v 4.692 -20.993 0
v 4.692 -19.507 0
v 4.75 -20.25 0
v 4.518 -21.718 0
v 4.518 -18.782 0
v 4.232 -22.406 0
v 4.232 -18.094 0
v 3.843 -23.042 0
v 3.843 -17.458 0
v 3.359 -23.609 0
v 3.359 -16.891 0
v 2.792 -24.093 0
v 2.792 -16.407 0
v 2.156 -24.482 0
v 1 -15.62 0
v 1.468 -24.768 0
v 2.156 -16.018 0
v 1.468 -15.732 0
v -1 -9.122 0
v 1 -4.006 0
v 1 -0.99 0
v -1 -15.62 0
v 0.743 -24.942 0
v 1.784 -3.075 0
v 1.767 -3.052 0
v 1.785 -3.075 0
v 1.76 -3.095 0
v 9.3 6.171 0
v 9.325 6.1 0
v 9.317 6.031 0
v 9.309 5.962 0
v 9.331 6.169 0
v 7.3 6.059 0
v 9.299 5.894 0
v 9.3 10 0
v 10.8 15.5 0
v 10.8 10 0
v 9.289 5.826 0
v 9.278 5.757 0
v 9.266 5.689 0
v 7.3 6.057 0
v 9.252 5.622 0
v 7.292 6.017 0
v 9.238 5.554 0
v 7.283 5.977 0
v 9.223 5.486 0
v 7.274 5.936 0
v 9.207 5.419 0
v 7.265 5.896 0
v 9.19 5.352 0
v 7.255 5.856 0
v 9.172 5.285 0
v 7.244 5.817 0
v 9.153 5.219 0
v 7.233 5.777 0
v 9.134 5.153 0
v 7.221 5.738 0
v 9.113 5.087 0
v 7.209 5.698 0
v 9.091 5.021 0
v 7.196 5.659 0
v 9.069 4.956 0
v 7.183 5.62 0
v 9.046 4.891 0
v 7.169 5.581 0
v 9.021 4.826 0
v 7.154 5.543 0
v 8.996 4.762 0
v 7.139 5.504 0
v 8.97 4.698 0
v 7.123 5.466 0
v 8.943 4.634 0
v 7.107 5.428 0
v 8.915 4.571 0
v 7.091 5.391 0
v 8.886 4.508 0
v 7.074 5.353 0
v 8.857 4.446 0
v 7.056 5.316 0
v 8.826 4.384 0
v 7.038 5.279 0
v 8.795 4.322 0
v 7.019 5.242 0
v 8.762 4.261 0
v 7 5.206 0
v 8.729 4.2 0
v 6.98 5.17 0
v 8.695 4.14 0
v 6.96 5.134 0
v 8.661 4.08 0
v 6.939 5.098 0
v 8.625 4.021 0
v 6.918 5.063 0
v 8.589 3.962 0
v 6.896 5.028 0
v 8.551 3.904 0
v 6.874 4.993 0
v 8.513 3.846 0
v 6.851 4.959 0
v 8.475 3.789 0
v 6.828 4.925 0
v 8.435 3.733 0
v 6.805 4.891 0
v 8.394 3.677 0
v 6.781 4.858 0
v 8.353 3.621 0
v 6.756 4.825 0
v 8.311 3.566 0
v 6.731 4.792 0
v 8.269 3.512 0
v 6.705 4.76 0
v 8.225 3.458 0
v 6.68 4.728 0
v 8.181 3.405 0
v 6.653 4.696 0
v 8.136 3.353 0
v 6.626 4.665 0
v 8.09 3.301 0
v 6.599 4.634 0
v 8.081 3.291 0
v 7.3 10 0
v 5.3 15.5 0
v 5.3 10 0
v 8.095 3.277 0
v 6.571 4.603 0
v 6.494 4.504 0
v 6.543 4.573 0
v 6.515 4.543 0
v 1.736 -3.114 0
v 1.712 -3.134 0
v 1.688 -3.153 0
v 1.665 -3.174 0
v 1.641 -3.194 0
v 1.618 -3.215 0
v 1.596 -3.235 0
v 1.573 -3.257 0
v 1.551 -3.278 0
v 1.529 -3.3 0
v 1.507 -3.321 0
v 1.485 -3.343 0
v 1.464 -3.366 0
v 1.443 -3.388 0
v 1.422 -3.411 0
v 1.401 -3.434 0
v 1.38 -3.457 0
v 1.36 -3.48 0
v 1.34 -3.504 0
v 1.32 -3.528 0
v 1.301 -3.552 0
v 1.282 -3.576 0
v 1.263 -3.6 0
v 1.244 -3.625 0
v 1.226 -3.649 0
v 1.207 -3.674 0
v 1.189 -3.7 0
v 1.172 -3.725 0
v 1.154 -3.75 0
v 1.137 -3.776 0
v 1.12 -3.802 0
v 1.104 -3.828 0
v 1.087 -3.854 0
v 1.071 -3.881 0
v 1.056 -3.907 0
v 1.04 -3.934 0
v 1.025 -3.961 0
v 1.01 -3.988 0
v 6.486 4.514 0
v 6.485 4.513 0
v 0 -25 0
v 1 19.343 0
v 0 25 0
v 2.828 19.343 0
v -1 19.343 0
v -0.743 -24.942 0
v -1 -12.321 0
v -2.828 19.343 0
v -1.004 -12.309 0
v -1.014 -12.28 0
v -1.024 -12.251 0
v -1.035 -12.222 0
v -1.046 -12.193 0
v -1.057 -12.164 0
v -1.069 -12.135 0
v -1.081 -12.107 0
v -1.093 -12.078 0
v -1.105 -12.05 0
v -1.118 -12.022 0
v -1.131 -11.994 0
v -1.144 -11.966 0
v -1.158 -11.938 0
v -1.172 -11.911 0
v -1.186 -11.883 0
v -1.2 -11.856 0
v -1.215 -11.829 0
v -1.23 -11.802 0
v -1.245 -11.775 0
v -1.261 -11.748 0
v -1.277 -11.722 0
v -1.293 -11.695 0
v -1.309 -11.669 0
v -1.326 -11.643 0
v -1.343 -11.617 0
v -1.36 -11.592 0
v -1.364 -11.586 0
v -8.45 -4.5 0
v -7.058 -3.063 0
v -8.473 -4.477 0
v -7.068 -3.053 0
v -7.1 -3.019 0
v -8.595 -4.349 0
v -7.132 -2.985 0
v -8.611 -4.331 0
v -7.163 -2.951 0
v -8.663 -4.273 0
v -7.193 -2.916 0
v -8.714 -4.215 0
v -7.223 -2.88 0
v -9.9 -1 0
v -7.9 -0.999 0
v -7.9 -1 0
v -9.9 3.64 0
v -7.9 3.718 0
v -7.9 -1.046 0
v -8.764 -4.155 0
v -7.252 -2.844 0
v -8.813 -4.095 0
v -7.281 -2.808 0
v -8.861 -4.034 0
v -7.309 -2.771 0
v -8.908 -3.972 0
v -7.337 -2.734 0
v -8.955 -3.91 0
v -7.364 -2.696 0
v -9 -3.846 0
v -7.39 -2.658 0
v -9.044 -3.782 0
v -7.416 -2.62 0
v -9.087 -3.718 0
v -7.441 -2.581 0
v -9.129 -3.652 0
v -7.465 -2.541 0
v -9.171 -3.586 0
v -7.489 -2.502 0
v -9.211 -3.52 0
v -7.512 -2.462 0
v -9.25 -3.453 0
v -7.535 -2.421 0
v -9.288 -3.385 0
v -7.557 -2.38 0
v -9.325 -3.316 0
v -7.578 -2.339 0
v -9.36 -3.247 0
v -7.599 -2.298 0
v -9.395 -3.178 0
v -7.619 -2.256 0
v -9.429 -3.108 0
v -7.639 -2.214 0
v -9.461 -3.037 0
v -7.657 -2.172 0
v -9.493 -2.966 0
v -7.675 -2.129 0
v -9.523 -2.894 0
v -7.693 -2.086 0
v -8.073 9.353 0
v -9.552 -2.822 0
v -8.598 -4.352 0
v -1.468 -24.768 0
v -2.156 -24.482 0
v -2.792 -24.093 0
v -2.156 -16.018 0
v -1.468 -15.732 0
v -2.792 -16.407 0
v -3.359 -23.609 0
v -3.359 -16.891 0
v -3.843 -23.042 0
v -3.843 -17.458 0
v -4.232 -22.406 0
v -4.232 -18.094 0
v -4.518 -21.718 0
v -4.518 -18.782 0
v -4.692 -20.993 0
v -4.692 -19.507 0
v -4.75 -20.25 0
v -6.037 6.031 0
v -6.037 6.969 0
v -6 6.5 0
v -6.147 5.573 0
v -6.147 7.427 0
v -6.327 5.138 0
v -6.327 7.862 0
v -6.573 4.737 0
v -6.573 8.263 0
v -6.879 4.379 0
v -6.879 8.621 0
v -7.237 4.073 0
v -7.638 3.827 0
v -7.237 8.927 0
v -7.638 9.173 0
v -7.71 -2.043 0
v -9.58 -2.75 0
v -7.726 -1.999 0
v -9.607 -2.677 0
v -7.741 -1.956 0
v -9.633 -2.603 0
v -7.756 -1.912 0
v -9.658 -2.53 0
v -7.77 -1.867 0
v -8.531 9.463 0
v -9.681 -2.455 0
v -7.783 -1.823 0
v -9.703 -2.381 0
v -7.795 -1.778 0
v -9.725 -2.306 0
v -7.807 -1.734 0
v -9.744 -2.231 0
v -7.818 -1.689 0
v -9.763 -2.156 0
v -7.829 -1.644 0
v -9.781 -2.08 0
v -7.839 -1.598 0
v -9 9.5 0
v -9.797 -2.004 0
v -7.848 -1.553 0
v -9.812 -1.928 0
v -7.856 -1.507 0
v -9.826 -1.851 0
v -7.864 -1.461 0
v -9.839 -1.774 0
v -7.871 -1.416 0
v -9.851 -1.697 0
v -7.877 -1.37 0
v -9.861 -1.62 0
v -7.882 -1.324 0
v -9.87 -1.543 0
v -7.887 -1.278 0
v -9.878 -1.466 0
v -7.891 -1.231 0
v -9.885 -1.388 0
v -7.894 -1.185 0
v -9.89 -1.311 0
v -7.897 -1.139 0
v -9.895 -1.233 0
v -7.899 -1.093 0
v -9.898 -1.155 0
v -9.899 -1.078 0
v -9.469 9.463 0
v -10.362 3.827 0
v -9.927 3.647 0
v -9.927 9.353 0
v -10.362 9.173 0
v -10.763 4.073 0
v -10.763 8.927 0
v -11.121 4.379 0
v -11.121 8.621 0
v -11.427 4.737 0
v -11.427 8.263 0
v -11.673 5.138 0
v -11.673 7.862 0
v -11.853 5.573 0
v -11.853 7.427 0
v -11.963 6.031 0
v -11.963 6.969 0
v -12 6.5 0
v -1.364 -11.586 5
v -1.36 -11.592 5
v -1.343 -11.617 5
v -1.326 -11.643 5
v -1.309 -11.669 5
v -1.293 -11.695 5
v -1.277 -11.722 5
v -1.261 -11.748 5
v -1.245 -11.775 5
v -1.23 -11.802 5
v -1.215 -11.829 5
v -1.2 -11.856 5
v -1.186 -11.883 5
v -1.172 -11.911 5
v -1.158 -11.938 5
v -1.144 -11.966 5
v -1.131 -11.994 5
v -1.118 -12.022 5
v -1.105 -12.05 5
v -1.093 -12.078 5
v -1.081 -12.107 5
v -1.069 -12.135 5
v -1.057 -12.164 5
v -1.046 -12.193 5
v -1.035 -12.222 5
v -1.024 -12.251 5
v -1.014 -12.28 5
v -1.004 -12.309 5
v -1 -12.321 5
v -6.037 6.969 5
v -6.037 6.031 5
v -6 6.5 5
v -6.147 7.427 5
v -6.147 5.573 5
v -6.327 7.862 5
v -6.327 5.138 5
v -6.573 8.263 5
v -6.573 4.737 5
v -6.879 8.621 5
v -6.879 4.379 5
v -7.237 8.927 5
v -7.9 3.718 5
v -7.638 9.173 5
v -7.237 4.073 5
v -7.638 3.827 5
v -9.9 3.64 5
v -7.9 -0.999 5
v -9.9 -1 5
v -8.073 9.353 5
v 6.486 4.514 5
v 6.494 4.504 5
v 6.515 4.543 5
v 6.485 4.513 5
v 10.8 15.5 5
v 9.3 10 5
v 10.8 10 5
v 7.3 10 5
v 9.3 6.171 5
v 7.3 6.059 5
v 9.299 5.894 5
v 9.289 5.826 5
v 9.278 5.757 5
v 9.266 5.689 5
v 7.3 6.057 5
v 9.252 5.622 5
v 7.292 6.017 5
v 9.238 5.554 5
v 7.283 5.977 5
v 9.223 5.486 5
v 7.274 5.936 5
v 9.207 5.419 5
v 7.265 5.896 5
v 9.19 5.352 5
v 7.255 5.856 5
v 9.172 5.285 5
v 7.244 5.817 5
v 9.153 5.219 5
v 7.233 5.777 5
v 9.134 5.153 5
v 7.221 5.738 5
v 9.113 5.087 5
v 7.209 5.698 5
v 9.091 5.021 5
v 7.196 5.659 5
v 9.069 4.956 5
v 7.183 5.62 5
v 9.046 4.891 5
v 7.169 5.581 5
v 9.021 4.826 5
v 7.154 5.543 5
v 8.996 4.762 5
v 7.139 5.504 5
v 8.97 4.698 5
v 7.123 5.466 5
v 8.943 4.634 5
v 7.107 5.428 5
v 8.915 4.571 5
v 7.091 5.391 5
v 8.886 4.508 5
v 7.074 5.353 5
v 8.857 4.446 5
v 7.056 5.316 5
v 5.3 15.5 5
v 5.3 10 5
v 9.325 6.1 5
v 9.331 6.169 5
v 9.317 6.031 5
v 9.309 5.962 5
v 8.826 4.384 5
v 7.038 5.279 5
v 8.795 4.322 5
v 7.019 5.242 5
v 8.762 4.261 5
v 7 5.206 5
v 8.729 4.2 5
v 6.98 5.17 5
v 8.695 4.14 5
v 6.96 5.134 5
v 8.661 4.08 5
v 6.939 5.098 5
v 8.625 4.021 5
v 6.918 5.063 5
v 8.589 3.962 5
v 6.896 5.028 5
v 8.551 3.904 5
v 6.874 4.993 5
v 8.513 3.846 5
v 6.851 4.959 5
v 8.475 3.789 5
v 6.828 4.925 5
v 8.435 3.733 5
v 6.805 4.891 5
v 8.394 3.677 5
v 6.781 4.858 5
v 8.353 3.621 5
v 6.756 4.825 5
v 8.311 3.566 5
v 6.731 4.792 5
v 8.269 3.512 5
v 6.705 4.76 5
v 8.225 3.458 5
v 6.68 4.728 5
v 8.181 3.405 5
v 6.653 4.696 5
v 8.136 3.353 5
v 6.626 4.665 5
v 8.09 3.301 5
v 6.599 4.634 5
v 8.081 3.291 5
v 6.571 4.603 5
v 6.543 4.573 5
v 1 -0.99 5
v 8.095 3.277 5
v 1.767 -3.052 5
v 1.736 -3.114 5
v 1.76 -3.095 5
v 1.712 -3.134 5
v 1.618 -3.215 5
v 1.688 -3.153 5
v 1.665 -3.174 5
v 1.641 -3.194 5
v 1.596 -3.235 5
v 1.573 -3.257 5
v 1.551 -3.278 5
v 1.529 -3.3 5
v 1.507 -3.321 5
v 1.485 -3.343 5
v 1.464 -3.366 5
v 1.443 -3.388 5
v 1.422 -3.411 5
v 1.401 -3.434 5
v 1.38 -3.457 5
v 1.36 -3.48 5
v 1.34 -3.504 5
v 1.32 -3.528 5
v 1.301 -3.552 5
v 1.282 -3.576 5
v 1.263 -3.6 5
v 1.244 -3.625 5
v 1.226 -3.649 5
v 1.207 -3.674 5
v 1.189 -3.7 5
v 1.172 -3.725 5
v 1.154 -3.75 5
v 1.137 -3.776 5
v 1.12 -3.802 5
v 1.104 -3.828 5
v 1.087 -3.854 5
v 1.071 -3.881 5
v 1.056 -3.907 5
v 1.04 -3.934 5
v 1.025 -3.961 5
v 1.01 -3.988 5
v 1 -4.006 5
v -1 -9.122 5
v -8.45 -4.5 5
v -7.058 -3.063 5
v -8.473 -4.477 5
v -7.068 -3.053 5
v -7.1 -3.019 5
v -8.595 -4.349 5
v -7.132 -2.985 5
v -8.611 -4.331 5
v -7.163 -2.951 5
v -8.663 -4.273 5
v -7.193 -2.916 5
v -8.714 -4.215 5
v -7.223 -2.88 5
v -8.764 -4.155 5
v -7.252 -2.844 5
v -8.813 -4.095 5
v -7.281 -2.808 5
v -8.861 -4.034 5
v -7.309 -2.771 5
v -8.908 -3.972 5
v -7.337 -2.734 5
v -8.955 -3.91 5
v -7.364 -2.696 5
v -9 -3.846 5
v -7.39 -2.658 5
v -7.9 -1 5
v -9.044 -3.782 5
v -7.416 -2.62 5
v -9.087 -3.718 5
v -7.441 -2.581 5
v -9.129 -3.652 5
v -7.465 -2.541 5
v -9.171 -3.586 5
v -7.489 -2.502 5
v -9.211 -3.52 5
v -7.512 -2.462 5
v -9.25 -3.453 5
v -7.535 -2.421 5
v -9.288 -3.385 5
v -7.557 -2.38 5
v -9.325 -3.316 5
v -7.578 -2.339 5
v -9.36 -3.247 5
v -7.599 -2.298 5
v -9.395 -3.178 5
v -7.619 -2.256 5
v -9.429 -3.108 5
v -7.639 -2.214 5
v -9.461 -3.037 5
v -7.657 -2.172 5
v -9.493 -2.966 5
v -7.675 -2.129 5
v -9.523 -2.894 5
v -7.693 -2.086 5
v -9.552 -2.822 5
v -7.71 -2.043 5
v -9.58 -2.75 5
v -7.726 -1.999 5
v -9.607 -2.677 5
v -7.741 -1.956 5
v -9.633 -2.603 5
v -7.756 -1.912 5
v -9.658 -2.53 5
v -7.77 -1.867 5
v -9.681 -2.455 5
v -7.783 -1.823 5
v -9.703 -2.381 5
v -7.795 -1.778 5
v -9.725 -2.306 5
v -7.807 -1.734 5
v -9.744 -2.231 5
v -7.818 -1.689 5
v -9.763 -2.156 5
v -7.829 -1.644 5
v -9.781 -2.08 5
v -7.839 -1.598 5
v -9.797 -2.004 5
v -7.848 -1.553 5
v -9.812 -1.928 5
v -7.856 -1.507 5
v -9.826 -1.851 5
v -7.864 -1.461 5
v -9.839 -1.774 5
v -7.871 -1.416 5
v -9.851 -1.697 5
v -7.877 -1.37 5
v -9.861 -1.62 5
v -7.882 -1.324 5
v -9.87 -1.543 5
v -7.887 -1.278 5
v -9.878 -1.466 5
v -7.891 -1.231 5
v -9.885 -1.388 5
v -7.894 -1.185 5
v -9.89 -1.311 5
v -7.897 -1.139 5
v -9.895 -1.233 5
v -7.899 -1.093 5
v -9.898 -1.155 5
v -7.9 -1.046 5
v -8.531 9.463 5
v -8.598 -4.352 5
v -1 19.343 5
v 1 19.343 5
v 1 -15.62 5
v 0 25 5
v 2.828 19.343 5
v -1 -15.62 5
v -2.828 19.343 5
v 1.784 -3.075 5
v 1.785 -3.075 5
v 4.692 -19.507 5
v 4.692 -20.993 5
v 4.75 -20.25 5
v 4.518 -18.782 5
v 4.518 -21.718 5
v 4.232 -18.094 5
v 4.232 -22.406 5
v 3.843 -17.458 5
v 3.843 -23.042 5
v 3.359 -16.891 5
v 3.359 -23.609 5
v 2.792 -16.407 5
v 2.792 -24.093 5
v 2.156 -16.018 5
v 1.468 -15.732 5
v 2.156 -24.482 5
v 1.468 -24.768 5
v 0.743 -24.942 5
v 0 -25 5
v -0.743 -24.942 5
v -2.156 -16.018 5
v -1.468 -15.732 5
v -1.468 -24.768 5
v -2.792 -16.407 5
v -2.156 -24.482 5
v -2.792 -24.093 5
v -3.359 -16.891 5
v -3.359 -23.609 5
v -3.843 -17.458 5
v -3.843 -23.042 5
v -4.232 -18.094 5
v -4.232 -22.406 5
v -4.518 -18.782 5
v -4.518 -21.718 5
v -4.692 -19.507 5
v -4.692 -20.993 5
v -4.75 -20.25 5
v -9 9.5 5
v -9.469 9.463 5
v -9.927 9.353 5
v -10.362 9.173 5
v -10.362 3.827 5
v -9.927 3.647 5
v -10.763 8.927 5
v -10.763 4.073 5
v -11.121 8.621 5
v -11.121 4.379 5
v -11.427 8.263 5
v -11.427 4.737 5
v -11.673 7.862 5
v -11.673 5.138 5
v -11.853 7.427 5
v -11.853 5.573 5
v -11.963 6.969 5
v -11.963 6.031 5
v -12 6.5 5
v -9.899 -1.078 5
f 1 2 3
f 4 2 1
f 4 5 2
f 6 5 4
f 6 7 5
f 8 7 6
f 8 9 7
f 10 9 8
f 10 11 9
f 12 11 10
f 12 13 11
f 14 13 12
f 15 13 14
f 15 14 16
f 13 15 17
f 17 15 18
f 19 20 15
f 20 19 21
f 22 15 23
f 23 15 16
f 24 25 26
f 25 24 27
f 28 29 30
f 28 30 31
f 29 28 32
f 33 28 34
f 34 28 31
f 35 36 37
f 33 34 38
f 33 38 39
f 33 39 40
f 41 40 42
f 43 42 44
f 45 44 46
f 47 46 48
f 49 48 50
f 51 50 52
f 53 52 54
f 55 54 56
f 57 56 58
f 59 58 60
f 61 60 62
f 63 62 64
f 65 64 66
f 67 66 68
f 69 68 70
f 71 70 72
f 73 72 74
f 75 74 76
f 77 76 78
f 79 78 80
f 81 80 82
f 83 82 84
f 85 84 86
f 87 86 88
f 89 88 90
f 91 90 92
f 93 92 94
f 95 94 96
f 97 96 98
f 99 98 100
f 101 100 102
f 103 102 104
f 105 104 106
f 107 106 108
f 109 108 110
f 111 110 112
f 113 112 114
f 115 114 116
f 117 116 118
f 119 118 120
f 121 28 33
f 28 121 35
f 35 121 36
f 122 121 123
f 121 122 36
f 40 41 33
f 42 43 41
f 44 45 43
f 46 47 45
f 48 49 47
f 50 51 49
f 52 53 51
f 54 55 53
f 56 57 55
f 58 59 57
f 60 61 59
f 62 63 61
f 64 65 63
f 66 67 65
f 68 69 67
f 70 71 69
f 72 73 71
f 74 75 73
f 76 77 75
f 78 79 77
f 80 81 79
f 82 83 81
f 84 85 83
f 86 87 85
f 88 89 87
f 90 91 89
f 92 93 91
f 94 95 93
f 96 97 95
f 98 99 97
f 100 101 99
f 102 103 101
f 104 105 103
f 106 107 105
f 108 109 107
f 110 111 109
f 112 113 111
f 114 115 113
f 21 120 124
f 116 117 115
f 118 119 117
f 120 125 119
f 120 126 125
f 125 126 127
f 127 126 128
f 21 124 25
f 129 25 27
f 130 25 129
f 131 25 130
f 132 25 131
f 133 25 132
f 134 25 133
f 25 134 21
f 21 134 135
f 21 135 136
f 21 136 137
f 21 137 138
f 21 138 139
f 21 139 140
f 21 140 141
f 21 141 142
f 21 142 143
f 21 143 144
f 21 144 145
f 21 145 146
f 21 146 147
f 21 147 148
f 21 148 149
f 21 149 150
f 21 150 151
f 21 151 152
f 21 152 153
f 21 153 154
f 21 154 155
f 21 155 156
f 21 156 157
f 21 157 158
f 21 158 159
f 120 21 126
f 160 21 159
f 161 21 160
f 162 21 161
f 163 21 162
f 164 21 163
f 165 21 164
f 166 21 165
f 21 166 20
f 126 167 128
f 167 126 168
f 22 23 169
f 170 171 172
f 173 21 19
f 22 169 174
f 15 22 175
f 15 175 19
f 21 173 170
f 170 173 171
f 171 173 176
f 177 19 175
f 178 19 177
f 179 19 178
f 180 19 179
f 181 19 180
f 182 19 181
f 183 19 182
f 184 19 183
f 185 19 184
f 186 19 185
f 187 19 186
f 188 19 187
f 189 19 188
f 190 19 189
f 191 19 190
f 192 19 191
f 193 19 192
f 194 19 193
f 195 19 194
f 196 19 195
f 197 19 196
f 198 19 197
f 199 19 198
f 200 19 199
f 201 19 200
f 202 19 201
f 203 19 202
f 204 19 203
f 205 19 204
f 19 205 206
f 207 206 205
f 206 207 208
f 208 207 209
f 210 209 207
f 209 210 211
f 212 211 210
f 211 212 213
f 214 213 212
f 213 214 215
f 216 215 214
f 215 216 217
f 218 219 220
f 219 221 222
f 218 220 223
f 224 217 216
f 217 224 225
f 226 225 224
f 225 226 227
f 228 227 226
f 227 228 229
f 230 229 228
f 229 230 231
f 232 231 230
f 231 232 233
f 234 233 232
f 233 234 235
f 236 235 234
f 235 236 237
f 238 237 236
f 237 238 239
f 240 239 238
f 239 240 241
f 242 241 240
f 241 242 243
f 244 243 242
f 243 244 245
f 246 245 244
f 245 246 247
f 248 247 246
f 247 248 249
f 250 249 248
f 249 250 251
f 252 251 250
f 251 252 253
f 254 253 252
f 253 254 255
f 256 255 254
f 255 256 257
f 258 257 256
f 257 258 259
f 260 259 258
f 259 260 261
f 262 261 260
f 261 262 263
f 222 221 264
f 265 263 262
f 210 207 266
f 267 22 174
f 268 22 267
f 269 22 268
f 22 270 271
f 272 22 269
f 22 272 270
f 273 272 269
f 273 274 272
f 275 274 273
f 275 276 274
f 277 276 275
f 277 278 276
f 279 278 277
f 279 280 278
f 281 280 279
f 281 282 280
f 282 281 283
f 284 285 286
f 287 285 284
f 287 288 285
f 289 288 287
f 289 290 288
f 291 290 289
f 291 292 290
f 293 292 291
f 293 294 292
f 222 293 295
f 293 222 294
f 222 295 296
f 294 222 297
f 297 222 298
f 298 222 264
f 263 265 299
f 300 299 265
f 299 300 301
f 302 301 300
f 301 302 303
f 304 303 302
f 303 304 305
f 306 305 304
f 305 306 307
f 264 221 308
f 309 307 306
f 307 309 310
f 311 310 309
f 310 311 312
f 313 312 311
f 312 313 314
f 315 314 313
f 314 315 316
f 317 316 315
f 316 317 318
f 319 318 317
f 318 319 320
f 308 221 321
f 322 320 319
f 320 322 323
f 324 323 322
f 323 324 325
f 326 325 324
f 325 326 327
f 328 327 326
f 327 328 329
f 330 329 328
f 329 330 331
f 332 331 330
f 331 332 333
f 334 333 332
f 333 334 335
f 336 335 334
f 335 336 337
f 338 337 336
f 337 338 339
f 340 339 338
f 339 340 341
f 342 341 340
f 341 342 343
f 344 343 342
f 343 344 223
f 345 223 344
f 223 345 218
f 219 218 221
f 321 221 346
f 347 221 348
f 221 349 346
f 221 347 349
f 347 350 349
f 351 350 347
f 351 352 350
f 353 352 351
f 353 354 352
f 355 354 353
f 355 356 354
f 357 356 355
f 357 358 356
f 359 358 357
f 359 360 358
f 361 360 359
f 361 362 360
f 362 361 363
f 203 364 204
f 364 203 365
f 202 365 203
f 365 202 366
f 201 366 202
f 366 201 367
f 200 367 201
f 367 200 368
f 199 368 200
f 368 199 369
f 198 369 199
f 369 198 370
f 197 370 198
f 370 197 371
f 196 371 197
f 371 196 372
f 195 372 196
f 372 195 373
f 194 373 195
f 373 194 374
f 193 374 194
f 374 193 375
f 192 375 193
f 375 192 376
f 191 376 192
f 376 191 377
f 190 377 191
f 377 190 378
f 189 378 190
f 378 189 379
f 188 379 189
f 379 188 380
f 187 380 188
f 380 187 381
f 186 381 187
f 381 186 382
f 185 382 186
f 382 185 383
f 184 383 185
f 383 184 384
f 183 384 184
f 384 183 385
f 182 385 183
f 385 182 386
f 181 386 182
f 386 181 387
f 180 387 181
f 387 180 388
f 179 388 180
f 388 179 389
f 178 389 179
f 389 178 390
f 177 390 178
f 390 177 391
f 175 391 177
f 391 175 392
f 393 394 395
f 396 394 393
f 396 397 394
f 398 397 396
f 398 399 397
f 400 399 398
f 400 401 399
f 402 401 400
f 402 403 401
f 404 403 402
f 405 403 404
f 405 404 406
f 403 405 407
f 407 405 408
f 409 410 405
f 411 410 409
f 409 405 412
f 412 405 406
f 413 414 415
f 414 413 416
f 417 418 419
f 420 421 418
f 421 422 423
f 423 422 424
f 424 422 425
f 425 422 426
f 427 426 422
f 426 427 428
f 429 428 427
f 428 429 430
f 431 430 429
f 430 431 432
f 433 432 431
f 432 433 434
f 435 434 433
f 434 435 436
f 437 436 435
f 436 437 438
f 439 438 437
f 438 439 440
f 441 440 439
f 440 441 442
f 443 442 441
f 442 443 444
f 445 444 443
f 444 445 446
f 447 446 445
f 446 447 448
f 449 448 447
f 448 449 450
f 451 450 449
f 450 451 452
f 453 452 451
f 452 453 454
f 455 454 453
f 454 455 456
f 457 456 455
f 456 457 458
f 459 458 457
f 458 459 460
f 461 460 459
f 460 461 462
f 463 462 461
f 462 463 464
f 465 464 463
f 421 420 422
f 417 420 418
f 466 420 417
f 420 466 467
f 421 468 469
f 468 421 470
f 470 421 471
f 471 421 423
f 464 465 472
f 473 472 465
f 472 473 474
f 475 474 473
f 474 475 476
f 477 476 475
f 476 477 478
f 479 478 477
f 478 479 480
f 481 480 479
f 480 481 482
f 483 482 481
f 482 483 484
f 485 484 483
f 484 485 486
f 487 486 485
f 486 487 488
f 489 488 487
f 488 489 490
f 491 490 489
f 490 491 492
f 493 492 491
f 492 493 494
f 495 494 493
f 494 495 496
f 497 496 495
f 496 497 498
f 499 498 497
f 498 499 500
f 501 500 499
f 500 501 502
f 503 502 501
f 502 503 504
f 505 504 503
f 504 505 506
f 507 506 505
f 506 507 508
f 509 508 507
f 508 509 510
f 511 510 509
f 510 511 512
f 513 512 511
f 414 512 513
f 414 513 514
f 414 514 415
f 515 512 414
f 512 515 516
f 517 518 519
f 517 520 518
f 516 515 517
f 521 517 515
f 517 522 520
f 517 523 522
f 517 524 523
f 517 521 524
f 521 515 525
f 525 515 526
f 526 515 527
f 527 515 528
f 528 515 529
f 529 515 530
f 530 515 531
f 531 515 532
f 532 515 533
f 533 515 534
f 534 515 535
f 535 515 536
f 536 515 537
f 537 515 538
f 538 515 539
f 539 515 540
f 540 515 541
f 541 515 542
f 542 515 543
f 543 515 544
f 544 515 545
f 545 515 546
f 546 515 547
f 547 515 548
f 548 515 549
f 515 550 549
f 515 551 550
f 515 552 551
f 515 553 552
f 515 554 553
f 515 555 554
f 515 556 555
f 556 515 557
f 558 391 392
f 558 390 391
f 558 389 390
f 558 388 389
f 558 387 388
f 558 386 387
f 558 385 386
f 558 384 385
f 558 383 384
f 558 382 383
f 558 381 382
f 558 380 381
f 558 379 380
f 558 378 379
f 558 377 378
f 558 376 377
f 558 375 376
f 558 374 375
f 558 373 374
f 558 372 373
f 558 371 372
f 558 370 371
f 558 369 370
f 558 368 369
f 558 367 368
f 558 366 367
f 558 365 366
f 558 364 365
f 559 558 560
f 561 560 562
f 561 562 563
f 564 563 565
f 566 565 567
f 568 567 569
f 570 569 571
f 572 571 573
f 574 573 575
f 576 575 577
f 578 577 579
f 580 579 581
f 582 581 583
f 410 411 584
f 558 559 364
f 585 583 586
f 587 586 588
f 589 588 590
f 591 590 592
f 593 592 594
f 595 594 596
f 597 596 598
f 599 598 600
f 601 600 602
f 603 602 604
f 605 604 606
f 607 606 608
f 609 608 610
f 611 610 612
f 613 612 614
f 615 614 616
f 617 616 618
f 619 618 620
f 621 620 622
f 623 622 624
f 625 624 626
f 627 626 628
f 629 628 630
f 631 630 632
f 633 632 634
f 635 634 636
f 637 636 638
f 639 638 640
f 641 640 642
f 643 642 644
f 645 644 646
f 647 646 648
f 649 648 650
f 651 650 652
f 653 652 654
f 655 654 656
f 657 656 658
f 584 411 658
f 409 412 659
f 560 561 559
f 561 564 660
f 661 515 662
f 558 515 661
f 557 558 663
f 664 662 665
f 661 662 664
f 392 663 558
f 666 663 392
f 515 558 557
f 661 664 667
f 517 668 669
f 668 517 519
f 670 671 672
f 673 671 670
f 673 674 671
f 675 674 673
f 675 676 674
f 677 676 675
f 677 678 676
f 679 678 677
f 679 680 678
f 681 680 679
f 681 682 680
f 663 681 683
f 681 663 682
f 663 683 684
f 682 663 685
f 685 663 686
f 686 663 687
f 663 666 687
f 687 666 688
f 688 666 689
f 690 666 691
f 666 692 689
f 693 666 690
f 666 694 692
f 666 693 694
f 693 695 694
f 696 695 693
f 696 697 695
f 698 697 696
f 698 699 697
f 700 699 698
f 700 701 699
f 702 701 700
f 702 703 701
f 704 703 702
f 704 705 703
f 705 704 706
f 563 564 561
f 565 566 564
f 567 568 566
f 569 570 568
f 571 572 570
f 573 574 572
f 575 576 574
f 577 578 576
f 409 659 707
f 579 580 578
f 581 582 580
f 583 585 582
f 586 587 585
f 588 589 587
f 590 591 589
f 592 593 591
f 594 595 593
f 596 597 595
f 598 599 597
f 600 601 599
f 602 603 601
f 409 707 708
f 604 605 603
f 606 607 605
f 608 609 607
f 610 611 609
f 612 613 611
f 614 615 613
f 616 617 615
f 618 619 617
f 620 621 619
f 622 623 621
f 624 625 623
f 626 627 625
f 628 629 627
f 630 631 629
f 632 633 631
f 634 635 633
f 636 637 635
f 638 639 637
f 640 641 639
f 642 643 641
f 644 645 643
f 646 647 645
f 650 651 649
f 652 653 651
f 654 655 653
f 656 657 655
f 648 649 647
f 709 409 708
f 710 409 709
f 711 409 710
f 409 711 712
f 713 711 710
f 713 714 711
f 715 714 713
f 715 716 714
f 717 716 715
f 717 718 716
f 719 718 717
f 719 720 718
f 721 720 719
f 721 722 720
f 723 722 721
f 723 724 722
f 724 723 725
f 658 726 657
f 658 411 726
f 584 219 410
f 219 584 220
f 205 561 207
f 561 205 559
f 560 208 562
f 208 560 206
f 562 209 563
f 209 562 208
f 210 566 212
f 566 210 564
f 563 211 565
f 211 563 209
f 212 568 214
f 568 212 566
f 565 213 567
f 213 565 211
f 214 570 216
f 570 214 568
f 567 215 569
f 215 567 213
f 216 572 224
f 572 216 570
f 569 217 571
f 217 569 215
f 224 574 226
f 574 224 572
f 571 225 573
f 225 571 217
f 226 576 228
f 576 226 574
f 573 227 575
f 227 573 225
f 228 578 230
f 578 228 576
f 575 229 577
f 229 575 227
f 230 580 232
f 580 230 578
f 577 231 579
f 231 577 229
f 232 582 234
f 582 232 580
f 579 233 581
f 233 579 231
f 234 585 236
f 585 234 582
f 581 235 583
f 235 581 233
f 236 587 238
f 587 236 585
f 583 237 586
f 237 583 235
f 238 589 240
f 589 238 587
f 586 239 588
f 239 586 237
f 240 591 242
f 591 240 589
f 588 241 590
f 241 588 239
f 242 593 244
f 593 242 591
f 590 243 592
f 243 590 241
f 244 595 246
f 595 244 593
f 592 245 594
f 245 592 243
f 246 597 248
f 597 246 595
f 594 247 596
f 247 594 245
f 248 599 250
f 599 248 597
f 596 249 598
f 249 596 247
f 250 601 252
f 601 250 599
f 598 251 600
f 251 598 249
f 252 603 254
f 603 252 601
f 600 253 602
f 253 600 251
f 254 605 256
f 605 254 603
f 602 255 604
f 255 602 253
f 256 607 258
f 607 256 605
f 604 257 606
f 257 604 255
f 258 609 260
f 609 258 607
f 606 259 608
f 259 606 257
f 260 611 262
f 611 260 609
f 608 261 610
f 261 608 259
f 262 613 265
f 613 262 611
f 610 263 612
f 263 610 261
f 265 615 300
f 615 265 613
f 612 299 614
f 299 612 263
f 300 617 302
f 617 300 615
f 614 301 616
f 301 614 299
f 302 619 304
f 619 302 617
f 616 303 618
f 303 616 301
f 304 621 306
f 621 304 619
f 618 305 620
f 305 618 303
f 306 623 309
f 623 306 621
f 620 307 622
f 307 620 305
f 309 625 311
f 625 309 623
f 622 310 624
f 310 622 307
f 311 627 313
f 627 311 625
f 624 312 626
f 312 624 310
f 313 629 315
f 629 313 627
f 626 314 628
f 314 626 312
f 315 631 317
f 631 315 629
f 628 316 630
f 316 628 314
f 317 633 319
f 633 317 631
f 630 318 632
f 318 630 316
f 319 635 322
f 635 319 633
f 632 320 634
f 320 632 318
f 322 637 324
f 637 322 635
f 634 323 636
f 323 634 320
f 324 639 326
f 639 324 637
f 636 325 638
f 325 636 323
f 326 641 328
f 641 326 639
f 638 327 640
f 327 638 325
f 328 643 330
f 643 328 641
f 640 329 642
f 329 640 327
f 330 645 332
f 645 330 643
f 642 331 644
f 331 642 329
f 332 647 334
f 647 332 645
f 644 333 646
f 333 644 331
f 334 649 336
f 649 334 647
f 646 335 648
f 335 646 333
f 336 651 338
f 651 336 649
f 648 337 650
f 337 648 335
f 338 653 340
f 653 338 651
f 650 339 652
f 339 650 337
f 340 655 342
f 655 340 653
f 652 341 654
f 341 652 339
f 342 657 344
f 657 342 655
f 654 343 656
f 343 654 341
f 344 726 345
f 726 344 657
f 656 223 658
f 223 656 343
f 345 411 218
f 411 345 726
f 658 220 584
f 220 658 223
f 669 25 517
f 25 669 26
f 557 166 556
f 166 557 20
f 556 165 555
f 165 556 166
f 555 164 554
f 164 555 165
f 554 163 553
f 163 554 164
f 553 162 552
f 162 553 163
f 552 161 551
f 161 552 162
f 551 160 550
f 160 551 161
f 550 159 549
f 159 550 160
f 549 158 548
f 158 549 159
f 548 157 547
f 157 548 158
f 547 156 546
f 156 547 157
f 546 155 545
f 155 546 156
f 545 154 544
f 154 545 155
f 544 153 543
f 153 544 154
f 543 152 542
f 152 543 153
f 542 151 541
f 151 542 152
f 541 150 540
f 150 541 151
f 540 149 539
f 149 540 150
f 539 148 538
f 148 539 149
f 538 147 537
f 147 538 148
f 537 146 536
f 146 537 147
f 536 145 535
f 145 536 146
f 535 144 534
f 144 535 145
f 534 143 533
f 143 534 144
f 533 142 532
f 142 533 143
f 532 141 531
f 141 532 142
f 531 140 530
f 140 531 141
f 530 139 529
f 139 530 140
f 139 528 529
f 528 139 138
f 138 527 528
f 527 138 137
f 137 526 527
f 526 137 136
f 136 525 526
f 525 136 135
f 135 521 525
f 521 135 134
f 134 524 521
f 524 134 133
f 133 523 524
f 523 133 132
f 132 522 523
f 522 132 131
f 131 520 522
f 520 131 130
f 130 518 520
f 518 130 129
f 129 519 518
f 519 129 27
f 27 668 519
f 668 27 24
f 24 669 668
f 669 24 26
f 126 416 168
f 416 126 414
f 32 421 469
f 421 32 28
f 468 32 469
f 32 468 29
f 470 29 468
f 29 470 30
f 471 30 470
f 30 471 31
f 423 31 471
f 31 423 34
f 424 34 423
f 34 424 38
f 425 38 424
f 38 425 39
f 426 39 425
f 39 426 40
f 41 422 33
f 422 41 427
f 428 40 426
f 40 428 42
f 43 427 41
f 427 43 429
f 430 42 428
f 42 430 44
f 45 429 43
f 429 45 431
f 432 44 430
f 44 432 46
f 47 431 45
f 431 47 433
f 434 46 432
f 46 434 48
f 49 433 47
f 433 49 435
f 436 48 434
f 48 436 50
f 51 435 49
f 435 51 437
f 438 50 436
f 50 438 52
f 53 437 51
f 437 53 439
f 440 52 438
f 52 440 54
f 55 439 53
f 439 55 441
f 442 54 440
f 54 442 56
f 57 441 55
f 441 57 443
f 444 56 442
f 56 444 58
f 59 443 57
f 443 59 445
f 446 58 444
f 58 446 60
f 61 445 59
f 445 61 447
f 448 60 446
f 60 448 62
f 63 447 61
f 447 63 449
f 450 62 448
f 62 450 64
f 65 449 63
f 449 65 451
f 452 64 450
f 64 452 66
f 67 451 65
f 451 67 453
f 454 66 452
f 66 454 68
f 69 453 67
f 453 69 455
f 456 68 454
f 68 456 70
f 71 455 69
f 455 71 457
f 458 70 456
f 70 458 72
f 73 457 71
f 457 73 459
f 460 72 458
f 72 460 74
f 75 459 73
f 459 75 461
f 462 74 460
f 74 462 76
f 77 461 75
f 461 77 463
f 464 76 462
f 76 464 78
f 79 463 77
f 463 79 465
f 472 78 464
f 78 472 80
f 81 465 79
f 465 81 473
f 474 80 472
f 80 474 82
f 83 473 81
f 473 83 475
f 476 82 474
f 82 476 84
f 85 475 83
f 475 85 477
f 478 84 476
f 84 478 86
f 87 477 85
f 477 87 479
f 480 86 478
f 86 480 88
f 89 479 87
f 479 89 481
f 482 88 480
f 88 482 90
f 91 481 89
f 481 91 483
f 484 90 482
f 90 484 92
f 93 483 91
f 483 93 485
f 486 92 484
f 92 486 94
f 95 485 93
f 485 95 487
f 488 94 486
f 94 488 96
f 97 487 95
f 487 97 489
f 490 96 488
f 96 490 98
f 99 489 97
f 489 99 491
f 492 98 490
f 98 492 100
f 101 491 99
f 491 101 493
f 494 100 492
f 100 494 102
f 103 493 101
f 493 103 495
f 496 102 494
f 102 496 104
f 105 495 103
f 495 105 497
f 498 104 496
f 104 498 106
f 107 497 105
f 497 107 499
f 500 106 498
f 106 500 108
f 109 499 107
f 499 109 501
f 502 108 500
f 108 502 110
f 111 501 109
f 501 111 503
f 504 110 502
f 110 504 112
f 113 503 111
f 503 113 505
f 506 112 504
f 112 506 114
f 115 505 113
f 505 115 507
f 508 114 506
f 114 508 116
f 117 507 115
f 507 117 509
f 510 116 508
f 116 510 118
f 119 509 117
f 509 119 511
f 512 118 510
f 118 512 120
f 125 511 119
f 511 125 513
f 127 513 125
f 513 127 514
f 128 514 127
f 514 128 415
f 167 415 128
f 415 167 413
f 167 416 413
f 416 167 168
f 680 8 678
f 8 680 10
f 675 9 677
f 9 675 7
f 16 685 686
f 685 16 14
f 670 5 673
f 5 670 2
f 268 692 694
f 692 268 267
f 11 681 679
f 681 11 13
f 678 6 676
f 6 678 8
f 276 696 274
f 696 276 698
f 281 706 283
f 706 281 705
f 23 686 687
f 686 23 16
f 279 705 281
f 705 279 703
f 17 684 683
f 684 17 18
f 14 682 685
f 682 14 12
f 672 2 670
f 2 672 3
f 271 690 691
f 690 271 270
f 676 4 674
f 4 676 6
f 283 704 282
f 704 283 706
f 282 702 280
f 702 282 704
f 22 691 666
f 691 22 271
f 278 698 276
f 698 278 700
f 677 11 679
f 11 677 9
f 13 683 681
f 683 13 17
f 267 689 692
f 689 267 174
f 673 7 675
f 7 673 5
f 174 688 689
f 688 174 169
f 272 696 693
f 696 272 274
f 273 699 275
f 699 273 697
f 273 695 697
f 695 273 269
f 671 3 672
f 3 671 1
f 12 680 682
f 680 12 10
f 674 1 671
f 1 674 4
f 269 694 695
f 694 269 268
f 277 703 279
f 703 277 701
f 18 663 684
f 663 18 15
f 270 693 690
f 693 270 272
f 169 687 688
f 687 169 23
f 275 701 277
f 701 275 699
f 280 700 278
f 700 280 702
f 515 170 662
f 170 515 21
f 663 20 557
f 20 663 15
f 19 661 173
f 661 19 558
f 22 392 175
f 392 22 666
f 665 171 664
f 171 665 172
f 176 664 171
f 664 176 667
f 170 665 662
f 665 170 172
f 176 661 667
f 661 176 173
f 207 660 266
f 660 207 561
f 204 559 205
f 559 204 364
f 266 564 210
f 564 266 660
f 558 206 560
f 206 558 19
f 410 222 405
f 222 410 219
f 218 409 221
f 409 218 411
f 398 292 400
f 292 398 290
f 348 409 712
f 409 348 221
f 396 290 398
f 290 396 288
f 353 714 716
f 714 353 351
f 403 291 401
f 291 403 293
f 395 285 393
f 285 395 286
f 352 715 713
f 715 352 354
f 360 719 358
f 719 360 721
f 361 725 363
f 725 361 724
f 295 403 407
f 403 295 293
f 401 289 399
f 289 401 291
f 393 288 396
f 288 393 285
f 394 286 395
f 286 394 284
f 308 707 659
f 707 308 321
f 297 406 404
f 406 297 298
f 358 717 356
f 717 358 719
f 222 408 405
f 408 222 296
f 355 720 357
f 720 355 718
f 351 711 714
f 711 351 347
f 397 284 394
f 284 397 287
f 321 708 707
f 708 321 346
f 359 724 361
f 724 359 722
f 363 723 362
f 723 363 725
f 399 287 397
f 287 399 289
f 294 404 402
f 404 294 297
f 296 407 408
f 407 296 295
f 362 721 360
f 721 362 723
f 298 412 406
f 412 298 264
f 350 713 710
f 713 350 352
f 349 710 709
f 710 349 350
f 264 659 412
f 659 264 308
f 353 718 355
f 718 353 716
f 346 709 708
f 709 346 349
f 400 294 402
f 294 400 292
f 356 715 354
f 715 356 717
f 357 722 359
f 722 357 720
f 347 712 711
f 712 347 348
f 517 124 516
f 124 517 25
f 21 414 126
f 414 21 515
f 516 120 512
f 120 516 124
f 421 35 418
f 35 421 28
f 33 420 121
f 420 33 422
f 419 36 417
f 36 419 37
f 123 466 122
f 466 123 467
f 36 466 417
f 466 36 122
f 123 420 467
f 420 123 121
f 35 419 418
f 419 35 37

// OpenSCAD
// file: CurvedRectangle.scad
/* Adapted from: http://forum.openscad.org/partial-rotate-extrude-td2695.html */

module curved_rectangle(Height,Dout,Din,StartAngle,EndAngle,Faces)
{ 
    
    StartAngle= (StartAngle < 0) ? 360+StartAngle : StartAngle; 
    EndAngle= (EndAngle < 0) ? 360+EndAngle : EndAngle; 
    EndAngle2 =  (EndAngle < StartAngle) ? StartAngle : EndAngle; 
    StartAngle2 =  (EndAngle < StartAngle) ? EndAngle : StartAngle; 
    
    if (EndAngle2-StartAngle2<360)
    { 
        
        NSides= (Faces < 3 || Faces==undef)  ?  DefaultFaces : Faces; 
        n=floor((EndAngle2-StartAngle2)/120); 
        Sect1=EndAngle2-StartAngle2-n*120; 
        Sect2= (n>0) ? 120 : 0; 
        Sect3=(n>1) ? 120 : 0; 
        
        intersection()
        { 
        rotate_extrude(convexity=2, $fn=floor(NSides*360/(EndAngle2-StartAngle2))) 
        translate([Din/2,0,0])
            square([(Dout-Din)/2,Height]); 
        
            union()
            { 
                hull()
                { 
                    rotate(StartAngle2)
                        cube([0.001,Dout,Height+1]); 
                    rotate((StartAngle2+Sect1))
                        cube([0.001,Dout,Height+1]); 
                } 
                hull()
                { 
                    rotate((StartAngle2+Sect1)) cube([0.001,Dout,Height+1]); 
                    rotate((StartAngle2+Sect1+Sect2)) cube([0.01,Dout,Height+1]); 
                } 
                hull()
                { 
                    rotate((StartAngle2+Sect1+Sect2))
                        cube([0.001,Dout,Height+1]); 
                    rotate((StartAngle2+Sect1+Sect2+Sect3))
                        cube([0.001,Dout,Height+1]); 
                }
            }	
        } 
    } 
    else
    { 
        echo("Only rotations less than 360 degrees are supported");
    } 
} 
// main file
/* Loic, August 2017 */


include <CurvedRectangle.scad>

usb_logo(5,50);


module usb_logo(height,length)
{
    
center = -length/2;
bob = length*0.04;

translate([0,center,0])
{
    ///////////
    // Main Arm
    ///////////
    
    // Main Arm Circle
    translate([0,(length*0.095),0])
        cylinder(height,length*0.095,length*0.095,$fn=40,false);

    translate([-length*0.02,length*0.05,0])
        cube([length*0.04,length*0.85,height]);


    translate([0,length,0])
    rotate(a=[0,0,-135])
        linear_extrude(height, center = false, convexity = 12, twist = 0)
            polygon(points=[[0,0],[length*0.12,length*0.04],[length*0.04,length*0.12]], paths=[[0,1,2]]);


    /////////////
    // Circle Arm
    /////////////
    
   translate([-length*0.076,length*0.235,0]) 
   rotate([0,0,225])
      curved_rectangle(height, Dout=bob*4.95, Din=bob*2.95, StartAngle=60, EndAngle=90, Faces=50); 
    
    translate([-length*0.027,length*0.268,0])
    rotate([0,0,45])
        cube([length*0.04,length*0.205,height]);
        
    translate([-length*0.099,length*0.48,0]) 
        curved_rectangle(height, Dout=bob*4.95, Din=bob*2.95, StartAngle=90, EndAngle=135, Faces=50); 
    
    translate([-length*0.198,length*0.48,0])
        cube([length*0.04,length*0.2,height]);
    
    // Circle Arm's Circle
    translate([-length*0.18,length*0.63,0])
        cylinder(height,length*0.06,length*0.06,$fn=40);


    /////////////
    // Square Arm
    /////////////
    
        
   translate([length*0.072,length*0.392,0]) 
   rotate([0,0,338])
      curved_rectangle(height, Dout=bob*4.95, Din=bob*2.95, StartAngle=60, EndAngle=90, Faces=50); 
    
    
    translate([length*0.0028,length*0.463,0])
    rotate([0,0,-45]) 
        cube([length*0.04,length*0.185,height]);
    
    translate([length*0.088,length*0.632,0]) 
    rotate([0,0,215])
        curved_rectangle(height, Dout=bob*4.95, Din=bob*2.95, StartAngle=10, EndAngle=50, Faces=50); 
        
    translate([length*0.146,length*0.618,0])
        cube([length*0.04,length*0.1,height]);
        
    translate([length*0.106,length*0.7,0])
        cube([length*0.11,length*0.11,height]);

}

}
